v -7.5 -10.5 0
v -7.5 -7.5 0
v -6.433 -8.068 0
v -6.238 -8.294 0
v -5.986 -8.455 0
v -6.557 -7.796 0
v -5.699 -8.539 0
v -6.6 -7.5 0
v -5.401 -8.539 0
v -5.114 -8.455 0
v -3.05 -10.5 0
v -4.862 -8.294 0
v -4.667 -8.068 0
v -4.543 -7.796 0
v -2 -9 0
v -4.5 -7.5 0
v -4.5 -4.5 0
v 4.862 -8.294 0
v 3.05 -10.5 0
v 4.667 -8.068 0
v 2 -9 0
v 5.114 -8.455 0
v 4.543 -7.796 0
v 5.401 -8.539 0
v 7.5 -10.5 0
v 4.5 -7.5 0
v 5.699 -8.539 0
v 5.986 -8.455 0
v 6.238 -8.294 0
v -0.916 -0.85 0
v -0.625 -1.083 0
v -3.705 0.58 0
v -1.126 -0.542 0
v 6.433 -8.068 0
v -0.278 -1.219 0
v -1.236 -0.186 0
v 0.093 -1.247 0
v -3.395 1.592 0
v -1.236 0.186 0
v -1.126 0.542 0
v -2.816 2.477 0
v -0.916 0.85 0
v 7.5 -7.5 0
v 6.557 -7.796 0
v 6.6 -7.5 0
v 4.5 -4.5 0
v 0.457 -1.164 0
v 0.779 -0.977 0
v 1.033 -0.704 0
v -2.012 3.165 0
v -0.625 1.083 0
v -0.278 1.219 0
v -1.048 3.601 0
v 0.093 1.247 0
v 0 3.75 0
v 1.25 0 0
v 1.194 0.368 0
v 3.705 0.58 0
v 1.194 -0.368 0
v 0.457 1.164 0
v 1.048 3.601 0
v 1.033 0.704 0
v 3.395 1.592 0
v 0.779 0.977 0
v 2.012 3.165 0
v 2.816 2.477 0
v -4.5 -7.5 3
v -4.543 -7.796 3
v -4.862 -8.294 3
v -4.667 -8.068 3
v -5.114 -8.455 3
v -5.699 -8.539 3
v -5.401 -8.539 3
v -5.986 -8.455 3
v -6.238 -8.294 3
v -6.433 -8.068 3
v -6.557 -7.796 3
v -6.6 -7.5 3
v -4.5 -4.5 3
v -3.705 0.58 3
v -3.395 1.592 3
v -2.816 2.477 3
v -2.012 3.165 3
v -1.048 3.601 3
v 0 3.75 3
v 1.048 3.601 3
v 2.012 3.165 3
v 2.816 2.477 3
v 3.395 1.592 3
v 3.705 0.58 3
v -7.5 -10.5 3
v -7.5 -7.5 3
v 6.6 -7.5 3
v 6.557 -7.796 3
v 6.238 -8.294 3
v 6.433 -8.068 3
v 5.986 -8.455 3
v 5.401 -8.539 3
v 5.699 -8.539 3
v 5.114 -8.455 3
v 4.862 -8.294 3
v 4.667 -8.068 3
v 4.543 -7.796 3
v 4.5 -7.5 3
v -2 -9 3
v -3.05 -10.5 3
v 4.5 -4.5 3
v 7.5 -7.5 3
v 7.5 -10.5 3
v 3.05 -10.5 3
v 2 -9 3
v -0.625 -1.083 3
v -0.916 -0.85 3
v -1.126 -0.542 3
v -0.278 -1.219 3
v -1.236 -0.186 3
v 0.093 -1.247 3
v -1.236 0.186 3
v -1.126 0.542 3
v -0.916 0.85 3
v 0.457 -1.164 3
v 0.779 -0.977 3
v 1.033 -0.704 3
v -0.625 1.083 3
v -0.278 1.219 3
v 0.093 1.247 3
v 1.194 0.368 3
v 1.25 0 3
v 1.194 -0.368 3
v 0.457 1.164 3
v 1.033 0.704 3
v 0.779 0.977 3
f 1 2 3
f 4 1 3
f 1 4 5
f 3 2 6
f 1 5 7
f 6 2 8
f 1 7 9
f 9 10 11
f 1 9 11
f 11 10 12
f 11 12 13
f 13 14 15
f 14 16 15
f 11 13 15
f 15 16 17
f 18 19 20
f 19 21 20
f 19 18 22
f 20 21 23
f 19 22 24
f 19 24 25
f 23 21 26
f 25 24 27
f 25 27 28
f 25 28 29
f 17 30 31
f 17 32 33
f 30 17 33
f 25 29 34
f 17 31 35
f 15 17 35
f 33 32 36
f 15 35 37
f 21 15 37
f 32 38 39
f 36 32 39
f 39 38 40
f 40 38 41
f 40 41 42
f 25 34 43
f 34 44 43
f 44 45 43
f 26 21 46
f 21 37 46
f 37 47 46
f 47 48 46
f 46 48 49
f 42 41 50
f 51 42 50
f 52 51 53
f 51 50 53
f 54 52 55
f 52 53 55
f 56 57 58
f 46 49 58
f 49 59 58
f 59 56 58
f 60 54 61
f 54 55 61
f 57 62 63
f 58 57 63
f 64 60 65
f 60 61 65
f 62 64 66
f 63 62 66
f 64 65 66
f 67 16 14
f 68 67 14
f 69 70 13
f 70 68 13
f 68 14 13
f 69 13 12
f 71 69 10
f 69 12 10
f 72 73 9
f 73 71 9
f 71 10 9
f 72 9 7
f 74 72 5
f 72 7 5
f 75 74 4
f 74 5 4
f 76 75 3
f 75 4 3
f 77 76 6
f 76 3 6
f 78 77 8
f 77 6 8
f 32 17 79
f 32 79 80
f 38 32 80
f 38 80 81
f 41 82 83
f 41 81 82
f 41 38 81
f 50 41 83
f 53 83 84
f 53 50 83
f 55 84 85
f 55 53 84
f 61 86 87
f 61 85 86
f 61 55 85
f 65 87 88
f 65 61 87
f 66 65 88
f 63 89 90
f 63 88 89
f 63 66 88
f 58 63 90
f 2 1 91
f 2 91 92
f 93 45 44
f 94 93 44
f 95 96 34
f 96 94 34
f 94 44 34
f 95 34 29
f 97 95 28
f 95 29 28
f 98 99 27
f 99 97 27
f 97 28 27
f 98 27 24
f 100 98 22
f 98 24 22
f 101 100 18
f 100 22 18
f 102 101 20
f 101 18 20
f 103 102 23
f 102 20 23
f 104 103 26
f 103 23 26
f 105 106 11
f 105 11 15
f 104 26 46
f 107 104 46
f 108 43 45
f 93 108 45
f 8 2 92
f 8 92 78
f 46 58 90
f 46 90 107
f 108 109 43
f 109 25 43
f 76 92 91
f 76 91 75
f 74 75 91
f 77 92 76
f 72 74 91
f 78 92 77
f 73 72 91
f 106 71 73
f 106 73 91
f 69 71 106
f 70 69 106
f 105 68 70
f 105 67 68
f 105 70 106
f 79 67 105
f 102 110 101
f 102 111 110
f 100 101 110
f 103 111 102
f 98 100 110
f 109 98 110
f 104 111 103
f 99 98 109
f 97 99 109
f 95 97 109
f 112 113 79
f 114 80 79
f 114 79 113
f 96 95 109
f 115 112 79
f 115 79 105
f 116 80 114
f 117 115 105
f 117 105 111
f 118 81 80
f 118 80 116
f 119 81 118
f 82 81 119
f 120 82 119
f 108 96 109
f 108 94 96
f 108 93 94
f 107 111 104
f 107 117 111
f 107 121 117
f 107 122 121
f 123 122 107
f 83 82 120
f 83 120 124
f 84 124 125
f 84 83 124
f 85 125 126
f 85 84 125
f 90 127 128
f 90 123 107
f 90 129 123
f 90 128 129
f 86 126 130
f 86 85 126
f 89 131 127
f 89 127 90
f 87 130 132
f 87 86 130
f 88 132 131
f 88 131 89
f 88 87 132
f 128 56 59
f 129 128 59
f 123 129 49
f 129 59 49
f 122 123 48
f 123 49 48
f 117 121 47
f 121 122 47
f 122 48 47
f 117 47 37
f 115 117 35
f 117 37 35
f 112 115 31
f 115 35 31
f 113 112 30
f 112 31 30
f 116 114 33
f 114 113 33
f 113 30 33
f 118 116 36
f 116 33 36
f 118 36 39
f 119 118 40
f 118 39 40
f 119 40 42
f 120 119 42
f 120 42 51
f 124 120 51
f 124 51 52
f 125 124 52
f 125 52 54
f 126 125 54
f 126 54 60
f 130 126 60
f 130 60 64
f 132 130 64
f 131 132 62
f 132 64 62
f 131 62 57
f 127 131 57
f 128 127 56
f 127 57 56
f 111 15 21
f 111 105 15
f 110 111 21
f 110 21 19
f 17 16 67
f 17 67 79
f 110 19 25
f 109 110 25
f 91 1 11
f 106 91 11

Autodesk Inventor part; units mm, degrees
ref_plane "YZ Plane" through (0, 0, 0) normal (1, 0, 0) x (0, 1, 0)
ref_plane "XZ Plane" through (0, 0, 0) normal (0, 1, 0) x (-1, 0, 0)
ref_plane "XY Plane" through (0, 0, 0) normal (0, 0, 1) x (1, 0, 0)
sketch "スケッチ1" plane through (0, 0, 0) normal (0, 0, 1) x (1, 0, 0)
  circle A0 centre (0, 0) radius 1.25
  circle A1 centre (0, 0) radius 3.75
  line L0 (-7.5, -10.5) -> (7.5, -10.5)
  line L1 (7.5, -10.5) -> (7.5, -7.5)
  line L2 (7.5, -7.5) -> (4.5, -7.5)
  line L3 (4.5, -7.5) -> (4.5, -4.5)
  line L4 (-7.5, -10.5) -> (-7.5, -7.5)
  line L5 (-7.5, -7.5) -> (-4.5, -7.5)
  line L6 (-4.5, -7.5) -> (-4.5, -4.5)
  line L7 (-4.5, -4.5) -> (-3.7049, 0.5799)
  line L8 (3.7049, 0.5799) -> (4.5, -4.5)
  arc A2 (-6.6, -7.5) -> (-4.5, -7.5) centre (-5.55, -7.5) ccw
  arc A3 (4.5, -7.5) -> (6.6, -7.5) centre (5.55, -7.5) ccw
  dimension "d0" = 2.5
  dimension "d1" = 7.5
  dimension "d2" = 15
  dimension "d3" = 3
  dimension "d4" = 3
  dimension "d5" = 3
  dimension "d6" = 3
  dimension "d7" = 3
  dimension "d8" = 3
  dimension "d9" = 4.5
  dimension "d10" = 7.5
  dimension "d11" = 2.1
  dimension "d12" = 2.1
extrude "押し出し1" add sketch "スケッチ1" along normal blind 3 contours A1 | A1 L8 L3 A3 L2 L1 L0 L4 L5 A2 L6 L7
sketch "スケッチ2" plane through (0, 0, 3) normal (0, 0, 1) x (1, 0, 0)
  circle A0 centre (0, 0) radius 1.25 projected
  arc A1 (3.7049, 0.5799) -> (-3.7049, 0.5799) centre (0, 0) ccw projected
  line L0 (-3.7049, 0.5799) -> (-4.5, -4.5) projected
  line L1 (-4.5, -4.5) -> (-4.5, -7.5) projected
  arc A2 (-6.6, -7.5) -> (-4.5, -7.5) centre (-5.55, -7.5) ccw projected
  line L2 (-6.6, -7.5) -> (-7.5, -7.5) projected
  line L3 (-7.5, -7.5) -> (-7.5, -10.5) projected
  line L4 (-7.5, -10.5) -> (7.5, -10.5) projected
  line L5 (7.5, -10.5) -> (7.5, -7.5) projected
  line L6 (7.5, -7.5) -> (6.6, -7.5) projected
  arc A3 (4.5, -7.5) -> (6.6, -7.5) centre (5.55, -7.5) ccw projected
  line L7 (4.5, -7.5) -> (4.5, -4.5) projected
  line L8 (4.5, -4.5) -> (3.7049, 0.5799) projected
  line L9 (-3.0503, -10.5) -> (-2, -9)
  line L10 (-2, -9) -> (2, -9)
  line L11 (2, -9) -> (3.0503, -10.5)
  dimension "d15" = 125
  dimension "d16" = 125
  dimension "d17" = 4
  dimension "d18" = 2
  dimension "d19" = 1.5
extrude "押し出し2" cut sketch "スケッチ2" against normal blind 3 contours L4 L9 L10 L11
properties part number "新型４留め具" material "アルミニウム 2014-T4"
